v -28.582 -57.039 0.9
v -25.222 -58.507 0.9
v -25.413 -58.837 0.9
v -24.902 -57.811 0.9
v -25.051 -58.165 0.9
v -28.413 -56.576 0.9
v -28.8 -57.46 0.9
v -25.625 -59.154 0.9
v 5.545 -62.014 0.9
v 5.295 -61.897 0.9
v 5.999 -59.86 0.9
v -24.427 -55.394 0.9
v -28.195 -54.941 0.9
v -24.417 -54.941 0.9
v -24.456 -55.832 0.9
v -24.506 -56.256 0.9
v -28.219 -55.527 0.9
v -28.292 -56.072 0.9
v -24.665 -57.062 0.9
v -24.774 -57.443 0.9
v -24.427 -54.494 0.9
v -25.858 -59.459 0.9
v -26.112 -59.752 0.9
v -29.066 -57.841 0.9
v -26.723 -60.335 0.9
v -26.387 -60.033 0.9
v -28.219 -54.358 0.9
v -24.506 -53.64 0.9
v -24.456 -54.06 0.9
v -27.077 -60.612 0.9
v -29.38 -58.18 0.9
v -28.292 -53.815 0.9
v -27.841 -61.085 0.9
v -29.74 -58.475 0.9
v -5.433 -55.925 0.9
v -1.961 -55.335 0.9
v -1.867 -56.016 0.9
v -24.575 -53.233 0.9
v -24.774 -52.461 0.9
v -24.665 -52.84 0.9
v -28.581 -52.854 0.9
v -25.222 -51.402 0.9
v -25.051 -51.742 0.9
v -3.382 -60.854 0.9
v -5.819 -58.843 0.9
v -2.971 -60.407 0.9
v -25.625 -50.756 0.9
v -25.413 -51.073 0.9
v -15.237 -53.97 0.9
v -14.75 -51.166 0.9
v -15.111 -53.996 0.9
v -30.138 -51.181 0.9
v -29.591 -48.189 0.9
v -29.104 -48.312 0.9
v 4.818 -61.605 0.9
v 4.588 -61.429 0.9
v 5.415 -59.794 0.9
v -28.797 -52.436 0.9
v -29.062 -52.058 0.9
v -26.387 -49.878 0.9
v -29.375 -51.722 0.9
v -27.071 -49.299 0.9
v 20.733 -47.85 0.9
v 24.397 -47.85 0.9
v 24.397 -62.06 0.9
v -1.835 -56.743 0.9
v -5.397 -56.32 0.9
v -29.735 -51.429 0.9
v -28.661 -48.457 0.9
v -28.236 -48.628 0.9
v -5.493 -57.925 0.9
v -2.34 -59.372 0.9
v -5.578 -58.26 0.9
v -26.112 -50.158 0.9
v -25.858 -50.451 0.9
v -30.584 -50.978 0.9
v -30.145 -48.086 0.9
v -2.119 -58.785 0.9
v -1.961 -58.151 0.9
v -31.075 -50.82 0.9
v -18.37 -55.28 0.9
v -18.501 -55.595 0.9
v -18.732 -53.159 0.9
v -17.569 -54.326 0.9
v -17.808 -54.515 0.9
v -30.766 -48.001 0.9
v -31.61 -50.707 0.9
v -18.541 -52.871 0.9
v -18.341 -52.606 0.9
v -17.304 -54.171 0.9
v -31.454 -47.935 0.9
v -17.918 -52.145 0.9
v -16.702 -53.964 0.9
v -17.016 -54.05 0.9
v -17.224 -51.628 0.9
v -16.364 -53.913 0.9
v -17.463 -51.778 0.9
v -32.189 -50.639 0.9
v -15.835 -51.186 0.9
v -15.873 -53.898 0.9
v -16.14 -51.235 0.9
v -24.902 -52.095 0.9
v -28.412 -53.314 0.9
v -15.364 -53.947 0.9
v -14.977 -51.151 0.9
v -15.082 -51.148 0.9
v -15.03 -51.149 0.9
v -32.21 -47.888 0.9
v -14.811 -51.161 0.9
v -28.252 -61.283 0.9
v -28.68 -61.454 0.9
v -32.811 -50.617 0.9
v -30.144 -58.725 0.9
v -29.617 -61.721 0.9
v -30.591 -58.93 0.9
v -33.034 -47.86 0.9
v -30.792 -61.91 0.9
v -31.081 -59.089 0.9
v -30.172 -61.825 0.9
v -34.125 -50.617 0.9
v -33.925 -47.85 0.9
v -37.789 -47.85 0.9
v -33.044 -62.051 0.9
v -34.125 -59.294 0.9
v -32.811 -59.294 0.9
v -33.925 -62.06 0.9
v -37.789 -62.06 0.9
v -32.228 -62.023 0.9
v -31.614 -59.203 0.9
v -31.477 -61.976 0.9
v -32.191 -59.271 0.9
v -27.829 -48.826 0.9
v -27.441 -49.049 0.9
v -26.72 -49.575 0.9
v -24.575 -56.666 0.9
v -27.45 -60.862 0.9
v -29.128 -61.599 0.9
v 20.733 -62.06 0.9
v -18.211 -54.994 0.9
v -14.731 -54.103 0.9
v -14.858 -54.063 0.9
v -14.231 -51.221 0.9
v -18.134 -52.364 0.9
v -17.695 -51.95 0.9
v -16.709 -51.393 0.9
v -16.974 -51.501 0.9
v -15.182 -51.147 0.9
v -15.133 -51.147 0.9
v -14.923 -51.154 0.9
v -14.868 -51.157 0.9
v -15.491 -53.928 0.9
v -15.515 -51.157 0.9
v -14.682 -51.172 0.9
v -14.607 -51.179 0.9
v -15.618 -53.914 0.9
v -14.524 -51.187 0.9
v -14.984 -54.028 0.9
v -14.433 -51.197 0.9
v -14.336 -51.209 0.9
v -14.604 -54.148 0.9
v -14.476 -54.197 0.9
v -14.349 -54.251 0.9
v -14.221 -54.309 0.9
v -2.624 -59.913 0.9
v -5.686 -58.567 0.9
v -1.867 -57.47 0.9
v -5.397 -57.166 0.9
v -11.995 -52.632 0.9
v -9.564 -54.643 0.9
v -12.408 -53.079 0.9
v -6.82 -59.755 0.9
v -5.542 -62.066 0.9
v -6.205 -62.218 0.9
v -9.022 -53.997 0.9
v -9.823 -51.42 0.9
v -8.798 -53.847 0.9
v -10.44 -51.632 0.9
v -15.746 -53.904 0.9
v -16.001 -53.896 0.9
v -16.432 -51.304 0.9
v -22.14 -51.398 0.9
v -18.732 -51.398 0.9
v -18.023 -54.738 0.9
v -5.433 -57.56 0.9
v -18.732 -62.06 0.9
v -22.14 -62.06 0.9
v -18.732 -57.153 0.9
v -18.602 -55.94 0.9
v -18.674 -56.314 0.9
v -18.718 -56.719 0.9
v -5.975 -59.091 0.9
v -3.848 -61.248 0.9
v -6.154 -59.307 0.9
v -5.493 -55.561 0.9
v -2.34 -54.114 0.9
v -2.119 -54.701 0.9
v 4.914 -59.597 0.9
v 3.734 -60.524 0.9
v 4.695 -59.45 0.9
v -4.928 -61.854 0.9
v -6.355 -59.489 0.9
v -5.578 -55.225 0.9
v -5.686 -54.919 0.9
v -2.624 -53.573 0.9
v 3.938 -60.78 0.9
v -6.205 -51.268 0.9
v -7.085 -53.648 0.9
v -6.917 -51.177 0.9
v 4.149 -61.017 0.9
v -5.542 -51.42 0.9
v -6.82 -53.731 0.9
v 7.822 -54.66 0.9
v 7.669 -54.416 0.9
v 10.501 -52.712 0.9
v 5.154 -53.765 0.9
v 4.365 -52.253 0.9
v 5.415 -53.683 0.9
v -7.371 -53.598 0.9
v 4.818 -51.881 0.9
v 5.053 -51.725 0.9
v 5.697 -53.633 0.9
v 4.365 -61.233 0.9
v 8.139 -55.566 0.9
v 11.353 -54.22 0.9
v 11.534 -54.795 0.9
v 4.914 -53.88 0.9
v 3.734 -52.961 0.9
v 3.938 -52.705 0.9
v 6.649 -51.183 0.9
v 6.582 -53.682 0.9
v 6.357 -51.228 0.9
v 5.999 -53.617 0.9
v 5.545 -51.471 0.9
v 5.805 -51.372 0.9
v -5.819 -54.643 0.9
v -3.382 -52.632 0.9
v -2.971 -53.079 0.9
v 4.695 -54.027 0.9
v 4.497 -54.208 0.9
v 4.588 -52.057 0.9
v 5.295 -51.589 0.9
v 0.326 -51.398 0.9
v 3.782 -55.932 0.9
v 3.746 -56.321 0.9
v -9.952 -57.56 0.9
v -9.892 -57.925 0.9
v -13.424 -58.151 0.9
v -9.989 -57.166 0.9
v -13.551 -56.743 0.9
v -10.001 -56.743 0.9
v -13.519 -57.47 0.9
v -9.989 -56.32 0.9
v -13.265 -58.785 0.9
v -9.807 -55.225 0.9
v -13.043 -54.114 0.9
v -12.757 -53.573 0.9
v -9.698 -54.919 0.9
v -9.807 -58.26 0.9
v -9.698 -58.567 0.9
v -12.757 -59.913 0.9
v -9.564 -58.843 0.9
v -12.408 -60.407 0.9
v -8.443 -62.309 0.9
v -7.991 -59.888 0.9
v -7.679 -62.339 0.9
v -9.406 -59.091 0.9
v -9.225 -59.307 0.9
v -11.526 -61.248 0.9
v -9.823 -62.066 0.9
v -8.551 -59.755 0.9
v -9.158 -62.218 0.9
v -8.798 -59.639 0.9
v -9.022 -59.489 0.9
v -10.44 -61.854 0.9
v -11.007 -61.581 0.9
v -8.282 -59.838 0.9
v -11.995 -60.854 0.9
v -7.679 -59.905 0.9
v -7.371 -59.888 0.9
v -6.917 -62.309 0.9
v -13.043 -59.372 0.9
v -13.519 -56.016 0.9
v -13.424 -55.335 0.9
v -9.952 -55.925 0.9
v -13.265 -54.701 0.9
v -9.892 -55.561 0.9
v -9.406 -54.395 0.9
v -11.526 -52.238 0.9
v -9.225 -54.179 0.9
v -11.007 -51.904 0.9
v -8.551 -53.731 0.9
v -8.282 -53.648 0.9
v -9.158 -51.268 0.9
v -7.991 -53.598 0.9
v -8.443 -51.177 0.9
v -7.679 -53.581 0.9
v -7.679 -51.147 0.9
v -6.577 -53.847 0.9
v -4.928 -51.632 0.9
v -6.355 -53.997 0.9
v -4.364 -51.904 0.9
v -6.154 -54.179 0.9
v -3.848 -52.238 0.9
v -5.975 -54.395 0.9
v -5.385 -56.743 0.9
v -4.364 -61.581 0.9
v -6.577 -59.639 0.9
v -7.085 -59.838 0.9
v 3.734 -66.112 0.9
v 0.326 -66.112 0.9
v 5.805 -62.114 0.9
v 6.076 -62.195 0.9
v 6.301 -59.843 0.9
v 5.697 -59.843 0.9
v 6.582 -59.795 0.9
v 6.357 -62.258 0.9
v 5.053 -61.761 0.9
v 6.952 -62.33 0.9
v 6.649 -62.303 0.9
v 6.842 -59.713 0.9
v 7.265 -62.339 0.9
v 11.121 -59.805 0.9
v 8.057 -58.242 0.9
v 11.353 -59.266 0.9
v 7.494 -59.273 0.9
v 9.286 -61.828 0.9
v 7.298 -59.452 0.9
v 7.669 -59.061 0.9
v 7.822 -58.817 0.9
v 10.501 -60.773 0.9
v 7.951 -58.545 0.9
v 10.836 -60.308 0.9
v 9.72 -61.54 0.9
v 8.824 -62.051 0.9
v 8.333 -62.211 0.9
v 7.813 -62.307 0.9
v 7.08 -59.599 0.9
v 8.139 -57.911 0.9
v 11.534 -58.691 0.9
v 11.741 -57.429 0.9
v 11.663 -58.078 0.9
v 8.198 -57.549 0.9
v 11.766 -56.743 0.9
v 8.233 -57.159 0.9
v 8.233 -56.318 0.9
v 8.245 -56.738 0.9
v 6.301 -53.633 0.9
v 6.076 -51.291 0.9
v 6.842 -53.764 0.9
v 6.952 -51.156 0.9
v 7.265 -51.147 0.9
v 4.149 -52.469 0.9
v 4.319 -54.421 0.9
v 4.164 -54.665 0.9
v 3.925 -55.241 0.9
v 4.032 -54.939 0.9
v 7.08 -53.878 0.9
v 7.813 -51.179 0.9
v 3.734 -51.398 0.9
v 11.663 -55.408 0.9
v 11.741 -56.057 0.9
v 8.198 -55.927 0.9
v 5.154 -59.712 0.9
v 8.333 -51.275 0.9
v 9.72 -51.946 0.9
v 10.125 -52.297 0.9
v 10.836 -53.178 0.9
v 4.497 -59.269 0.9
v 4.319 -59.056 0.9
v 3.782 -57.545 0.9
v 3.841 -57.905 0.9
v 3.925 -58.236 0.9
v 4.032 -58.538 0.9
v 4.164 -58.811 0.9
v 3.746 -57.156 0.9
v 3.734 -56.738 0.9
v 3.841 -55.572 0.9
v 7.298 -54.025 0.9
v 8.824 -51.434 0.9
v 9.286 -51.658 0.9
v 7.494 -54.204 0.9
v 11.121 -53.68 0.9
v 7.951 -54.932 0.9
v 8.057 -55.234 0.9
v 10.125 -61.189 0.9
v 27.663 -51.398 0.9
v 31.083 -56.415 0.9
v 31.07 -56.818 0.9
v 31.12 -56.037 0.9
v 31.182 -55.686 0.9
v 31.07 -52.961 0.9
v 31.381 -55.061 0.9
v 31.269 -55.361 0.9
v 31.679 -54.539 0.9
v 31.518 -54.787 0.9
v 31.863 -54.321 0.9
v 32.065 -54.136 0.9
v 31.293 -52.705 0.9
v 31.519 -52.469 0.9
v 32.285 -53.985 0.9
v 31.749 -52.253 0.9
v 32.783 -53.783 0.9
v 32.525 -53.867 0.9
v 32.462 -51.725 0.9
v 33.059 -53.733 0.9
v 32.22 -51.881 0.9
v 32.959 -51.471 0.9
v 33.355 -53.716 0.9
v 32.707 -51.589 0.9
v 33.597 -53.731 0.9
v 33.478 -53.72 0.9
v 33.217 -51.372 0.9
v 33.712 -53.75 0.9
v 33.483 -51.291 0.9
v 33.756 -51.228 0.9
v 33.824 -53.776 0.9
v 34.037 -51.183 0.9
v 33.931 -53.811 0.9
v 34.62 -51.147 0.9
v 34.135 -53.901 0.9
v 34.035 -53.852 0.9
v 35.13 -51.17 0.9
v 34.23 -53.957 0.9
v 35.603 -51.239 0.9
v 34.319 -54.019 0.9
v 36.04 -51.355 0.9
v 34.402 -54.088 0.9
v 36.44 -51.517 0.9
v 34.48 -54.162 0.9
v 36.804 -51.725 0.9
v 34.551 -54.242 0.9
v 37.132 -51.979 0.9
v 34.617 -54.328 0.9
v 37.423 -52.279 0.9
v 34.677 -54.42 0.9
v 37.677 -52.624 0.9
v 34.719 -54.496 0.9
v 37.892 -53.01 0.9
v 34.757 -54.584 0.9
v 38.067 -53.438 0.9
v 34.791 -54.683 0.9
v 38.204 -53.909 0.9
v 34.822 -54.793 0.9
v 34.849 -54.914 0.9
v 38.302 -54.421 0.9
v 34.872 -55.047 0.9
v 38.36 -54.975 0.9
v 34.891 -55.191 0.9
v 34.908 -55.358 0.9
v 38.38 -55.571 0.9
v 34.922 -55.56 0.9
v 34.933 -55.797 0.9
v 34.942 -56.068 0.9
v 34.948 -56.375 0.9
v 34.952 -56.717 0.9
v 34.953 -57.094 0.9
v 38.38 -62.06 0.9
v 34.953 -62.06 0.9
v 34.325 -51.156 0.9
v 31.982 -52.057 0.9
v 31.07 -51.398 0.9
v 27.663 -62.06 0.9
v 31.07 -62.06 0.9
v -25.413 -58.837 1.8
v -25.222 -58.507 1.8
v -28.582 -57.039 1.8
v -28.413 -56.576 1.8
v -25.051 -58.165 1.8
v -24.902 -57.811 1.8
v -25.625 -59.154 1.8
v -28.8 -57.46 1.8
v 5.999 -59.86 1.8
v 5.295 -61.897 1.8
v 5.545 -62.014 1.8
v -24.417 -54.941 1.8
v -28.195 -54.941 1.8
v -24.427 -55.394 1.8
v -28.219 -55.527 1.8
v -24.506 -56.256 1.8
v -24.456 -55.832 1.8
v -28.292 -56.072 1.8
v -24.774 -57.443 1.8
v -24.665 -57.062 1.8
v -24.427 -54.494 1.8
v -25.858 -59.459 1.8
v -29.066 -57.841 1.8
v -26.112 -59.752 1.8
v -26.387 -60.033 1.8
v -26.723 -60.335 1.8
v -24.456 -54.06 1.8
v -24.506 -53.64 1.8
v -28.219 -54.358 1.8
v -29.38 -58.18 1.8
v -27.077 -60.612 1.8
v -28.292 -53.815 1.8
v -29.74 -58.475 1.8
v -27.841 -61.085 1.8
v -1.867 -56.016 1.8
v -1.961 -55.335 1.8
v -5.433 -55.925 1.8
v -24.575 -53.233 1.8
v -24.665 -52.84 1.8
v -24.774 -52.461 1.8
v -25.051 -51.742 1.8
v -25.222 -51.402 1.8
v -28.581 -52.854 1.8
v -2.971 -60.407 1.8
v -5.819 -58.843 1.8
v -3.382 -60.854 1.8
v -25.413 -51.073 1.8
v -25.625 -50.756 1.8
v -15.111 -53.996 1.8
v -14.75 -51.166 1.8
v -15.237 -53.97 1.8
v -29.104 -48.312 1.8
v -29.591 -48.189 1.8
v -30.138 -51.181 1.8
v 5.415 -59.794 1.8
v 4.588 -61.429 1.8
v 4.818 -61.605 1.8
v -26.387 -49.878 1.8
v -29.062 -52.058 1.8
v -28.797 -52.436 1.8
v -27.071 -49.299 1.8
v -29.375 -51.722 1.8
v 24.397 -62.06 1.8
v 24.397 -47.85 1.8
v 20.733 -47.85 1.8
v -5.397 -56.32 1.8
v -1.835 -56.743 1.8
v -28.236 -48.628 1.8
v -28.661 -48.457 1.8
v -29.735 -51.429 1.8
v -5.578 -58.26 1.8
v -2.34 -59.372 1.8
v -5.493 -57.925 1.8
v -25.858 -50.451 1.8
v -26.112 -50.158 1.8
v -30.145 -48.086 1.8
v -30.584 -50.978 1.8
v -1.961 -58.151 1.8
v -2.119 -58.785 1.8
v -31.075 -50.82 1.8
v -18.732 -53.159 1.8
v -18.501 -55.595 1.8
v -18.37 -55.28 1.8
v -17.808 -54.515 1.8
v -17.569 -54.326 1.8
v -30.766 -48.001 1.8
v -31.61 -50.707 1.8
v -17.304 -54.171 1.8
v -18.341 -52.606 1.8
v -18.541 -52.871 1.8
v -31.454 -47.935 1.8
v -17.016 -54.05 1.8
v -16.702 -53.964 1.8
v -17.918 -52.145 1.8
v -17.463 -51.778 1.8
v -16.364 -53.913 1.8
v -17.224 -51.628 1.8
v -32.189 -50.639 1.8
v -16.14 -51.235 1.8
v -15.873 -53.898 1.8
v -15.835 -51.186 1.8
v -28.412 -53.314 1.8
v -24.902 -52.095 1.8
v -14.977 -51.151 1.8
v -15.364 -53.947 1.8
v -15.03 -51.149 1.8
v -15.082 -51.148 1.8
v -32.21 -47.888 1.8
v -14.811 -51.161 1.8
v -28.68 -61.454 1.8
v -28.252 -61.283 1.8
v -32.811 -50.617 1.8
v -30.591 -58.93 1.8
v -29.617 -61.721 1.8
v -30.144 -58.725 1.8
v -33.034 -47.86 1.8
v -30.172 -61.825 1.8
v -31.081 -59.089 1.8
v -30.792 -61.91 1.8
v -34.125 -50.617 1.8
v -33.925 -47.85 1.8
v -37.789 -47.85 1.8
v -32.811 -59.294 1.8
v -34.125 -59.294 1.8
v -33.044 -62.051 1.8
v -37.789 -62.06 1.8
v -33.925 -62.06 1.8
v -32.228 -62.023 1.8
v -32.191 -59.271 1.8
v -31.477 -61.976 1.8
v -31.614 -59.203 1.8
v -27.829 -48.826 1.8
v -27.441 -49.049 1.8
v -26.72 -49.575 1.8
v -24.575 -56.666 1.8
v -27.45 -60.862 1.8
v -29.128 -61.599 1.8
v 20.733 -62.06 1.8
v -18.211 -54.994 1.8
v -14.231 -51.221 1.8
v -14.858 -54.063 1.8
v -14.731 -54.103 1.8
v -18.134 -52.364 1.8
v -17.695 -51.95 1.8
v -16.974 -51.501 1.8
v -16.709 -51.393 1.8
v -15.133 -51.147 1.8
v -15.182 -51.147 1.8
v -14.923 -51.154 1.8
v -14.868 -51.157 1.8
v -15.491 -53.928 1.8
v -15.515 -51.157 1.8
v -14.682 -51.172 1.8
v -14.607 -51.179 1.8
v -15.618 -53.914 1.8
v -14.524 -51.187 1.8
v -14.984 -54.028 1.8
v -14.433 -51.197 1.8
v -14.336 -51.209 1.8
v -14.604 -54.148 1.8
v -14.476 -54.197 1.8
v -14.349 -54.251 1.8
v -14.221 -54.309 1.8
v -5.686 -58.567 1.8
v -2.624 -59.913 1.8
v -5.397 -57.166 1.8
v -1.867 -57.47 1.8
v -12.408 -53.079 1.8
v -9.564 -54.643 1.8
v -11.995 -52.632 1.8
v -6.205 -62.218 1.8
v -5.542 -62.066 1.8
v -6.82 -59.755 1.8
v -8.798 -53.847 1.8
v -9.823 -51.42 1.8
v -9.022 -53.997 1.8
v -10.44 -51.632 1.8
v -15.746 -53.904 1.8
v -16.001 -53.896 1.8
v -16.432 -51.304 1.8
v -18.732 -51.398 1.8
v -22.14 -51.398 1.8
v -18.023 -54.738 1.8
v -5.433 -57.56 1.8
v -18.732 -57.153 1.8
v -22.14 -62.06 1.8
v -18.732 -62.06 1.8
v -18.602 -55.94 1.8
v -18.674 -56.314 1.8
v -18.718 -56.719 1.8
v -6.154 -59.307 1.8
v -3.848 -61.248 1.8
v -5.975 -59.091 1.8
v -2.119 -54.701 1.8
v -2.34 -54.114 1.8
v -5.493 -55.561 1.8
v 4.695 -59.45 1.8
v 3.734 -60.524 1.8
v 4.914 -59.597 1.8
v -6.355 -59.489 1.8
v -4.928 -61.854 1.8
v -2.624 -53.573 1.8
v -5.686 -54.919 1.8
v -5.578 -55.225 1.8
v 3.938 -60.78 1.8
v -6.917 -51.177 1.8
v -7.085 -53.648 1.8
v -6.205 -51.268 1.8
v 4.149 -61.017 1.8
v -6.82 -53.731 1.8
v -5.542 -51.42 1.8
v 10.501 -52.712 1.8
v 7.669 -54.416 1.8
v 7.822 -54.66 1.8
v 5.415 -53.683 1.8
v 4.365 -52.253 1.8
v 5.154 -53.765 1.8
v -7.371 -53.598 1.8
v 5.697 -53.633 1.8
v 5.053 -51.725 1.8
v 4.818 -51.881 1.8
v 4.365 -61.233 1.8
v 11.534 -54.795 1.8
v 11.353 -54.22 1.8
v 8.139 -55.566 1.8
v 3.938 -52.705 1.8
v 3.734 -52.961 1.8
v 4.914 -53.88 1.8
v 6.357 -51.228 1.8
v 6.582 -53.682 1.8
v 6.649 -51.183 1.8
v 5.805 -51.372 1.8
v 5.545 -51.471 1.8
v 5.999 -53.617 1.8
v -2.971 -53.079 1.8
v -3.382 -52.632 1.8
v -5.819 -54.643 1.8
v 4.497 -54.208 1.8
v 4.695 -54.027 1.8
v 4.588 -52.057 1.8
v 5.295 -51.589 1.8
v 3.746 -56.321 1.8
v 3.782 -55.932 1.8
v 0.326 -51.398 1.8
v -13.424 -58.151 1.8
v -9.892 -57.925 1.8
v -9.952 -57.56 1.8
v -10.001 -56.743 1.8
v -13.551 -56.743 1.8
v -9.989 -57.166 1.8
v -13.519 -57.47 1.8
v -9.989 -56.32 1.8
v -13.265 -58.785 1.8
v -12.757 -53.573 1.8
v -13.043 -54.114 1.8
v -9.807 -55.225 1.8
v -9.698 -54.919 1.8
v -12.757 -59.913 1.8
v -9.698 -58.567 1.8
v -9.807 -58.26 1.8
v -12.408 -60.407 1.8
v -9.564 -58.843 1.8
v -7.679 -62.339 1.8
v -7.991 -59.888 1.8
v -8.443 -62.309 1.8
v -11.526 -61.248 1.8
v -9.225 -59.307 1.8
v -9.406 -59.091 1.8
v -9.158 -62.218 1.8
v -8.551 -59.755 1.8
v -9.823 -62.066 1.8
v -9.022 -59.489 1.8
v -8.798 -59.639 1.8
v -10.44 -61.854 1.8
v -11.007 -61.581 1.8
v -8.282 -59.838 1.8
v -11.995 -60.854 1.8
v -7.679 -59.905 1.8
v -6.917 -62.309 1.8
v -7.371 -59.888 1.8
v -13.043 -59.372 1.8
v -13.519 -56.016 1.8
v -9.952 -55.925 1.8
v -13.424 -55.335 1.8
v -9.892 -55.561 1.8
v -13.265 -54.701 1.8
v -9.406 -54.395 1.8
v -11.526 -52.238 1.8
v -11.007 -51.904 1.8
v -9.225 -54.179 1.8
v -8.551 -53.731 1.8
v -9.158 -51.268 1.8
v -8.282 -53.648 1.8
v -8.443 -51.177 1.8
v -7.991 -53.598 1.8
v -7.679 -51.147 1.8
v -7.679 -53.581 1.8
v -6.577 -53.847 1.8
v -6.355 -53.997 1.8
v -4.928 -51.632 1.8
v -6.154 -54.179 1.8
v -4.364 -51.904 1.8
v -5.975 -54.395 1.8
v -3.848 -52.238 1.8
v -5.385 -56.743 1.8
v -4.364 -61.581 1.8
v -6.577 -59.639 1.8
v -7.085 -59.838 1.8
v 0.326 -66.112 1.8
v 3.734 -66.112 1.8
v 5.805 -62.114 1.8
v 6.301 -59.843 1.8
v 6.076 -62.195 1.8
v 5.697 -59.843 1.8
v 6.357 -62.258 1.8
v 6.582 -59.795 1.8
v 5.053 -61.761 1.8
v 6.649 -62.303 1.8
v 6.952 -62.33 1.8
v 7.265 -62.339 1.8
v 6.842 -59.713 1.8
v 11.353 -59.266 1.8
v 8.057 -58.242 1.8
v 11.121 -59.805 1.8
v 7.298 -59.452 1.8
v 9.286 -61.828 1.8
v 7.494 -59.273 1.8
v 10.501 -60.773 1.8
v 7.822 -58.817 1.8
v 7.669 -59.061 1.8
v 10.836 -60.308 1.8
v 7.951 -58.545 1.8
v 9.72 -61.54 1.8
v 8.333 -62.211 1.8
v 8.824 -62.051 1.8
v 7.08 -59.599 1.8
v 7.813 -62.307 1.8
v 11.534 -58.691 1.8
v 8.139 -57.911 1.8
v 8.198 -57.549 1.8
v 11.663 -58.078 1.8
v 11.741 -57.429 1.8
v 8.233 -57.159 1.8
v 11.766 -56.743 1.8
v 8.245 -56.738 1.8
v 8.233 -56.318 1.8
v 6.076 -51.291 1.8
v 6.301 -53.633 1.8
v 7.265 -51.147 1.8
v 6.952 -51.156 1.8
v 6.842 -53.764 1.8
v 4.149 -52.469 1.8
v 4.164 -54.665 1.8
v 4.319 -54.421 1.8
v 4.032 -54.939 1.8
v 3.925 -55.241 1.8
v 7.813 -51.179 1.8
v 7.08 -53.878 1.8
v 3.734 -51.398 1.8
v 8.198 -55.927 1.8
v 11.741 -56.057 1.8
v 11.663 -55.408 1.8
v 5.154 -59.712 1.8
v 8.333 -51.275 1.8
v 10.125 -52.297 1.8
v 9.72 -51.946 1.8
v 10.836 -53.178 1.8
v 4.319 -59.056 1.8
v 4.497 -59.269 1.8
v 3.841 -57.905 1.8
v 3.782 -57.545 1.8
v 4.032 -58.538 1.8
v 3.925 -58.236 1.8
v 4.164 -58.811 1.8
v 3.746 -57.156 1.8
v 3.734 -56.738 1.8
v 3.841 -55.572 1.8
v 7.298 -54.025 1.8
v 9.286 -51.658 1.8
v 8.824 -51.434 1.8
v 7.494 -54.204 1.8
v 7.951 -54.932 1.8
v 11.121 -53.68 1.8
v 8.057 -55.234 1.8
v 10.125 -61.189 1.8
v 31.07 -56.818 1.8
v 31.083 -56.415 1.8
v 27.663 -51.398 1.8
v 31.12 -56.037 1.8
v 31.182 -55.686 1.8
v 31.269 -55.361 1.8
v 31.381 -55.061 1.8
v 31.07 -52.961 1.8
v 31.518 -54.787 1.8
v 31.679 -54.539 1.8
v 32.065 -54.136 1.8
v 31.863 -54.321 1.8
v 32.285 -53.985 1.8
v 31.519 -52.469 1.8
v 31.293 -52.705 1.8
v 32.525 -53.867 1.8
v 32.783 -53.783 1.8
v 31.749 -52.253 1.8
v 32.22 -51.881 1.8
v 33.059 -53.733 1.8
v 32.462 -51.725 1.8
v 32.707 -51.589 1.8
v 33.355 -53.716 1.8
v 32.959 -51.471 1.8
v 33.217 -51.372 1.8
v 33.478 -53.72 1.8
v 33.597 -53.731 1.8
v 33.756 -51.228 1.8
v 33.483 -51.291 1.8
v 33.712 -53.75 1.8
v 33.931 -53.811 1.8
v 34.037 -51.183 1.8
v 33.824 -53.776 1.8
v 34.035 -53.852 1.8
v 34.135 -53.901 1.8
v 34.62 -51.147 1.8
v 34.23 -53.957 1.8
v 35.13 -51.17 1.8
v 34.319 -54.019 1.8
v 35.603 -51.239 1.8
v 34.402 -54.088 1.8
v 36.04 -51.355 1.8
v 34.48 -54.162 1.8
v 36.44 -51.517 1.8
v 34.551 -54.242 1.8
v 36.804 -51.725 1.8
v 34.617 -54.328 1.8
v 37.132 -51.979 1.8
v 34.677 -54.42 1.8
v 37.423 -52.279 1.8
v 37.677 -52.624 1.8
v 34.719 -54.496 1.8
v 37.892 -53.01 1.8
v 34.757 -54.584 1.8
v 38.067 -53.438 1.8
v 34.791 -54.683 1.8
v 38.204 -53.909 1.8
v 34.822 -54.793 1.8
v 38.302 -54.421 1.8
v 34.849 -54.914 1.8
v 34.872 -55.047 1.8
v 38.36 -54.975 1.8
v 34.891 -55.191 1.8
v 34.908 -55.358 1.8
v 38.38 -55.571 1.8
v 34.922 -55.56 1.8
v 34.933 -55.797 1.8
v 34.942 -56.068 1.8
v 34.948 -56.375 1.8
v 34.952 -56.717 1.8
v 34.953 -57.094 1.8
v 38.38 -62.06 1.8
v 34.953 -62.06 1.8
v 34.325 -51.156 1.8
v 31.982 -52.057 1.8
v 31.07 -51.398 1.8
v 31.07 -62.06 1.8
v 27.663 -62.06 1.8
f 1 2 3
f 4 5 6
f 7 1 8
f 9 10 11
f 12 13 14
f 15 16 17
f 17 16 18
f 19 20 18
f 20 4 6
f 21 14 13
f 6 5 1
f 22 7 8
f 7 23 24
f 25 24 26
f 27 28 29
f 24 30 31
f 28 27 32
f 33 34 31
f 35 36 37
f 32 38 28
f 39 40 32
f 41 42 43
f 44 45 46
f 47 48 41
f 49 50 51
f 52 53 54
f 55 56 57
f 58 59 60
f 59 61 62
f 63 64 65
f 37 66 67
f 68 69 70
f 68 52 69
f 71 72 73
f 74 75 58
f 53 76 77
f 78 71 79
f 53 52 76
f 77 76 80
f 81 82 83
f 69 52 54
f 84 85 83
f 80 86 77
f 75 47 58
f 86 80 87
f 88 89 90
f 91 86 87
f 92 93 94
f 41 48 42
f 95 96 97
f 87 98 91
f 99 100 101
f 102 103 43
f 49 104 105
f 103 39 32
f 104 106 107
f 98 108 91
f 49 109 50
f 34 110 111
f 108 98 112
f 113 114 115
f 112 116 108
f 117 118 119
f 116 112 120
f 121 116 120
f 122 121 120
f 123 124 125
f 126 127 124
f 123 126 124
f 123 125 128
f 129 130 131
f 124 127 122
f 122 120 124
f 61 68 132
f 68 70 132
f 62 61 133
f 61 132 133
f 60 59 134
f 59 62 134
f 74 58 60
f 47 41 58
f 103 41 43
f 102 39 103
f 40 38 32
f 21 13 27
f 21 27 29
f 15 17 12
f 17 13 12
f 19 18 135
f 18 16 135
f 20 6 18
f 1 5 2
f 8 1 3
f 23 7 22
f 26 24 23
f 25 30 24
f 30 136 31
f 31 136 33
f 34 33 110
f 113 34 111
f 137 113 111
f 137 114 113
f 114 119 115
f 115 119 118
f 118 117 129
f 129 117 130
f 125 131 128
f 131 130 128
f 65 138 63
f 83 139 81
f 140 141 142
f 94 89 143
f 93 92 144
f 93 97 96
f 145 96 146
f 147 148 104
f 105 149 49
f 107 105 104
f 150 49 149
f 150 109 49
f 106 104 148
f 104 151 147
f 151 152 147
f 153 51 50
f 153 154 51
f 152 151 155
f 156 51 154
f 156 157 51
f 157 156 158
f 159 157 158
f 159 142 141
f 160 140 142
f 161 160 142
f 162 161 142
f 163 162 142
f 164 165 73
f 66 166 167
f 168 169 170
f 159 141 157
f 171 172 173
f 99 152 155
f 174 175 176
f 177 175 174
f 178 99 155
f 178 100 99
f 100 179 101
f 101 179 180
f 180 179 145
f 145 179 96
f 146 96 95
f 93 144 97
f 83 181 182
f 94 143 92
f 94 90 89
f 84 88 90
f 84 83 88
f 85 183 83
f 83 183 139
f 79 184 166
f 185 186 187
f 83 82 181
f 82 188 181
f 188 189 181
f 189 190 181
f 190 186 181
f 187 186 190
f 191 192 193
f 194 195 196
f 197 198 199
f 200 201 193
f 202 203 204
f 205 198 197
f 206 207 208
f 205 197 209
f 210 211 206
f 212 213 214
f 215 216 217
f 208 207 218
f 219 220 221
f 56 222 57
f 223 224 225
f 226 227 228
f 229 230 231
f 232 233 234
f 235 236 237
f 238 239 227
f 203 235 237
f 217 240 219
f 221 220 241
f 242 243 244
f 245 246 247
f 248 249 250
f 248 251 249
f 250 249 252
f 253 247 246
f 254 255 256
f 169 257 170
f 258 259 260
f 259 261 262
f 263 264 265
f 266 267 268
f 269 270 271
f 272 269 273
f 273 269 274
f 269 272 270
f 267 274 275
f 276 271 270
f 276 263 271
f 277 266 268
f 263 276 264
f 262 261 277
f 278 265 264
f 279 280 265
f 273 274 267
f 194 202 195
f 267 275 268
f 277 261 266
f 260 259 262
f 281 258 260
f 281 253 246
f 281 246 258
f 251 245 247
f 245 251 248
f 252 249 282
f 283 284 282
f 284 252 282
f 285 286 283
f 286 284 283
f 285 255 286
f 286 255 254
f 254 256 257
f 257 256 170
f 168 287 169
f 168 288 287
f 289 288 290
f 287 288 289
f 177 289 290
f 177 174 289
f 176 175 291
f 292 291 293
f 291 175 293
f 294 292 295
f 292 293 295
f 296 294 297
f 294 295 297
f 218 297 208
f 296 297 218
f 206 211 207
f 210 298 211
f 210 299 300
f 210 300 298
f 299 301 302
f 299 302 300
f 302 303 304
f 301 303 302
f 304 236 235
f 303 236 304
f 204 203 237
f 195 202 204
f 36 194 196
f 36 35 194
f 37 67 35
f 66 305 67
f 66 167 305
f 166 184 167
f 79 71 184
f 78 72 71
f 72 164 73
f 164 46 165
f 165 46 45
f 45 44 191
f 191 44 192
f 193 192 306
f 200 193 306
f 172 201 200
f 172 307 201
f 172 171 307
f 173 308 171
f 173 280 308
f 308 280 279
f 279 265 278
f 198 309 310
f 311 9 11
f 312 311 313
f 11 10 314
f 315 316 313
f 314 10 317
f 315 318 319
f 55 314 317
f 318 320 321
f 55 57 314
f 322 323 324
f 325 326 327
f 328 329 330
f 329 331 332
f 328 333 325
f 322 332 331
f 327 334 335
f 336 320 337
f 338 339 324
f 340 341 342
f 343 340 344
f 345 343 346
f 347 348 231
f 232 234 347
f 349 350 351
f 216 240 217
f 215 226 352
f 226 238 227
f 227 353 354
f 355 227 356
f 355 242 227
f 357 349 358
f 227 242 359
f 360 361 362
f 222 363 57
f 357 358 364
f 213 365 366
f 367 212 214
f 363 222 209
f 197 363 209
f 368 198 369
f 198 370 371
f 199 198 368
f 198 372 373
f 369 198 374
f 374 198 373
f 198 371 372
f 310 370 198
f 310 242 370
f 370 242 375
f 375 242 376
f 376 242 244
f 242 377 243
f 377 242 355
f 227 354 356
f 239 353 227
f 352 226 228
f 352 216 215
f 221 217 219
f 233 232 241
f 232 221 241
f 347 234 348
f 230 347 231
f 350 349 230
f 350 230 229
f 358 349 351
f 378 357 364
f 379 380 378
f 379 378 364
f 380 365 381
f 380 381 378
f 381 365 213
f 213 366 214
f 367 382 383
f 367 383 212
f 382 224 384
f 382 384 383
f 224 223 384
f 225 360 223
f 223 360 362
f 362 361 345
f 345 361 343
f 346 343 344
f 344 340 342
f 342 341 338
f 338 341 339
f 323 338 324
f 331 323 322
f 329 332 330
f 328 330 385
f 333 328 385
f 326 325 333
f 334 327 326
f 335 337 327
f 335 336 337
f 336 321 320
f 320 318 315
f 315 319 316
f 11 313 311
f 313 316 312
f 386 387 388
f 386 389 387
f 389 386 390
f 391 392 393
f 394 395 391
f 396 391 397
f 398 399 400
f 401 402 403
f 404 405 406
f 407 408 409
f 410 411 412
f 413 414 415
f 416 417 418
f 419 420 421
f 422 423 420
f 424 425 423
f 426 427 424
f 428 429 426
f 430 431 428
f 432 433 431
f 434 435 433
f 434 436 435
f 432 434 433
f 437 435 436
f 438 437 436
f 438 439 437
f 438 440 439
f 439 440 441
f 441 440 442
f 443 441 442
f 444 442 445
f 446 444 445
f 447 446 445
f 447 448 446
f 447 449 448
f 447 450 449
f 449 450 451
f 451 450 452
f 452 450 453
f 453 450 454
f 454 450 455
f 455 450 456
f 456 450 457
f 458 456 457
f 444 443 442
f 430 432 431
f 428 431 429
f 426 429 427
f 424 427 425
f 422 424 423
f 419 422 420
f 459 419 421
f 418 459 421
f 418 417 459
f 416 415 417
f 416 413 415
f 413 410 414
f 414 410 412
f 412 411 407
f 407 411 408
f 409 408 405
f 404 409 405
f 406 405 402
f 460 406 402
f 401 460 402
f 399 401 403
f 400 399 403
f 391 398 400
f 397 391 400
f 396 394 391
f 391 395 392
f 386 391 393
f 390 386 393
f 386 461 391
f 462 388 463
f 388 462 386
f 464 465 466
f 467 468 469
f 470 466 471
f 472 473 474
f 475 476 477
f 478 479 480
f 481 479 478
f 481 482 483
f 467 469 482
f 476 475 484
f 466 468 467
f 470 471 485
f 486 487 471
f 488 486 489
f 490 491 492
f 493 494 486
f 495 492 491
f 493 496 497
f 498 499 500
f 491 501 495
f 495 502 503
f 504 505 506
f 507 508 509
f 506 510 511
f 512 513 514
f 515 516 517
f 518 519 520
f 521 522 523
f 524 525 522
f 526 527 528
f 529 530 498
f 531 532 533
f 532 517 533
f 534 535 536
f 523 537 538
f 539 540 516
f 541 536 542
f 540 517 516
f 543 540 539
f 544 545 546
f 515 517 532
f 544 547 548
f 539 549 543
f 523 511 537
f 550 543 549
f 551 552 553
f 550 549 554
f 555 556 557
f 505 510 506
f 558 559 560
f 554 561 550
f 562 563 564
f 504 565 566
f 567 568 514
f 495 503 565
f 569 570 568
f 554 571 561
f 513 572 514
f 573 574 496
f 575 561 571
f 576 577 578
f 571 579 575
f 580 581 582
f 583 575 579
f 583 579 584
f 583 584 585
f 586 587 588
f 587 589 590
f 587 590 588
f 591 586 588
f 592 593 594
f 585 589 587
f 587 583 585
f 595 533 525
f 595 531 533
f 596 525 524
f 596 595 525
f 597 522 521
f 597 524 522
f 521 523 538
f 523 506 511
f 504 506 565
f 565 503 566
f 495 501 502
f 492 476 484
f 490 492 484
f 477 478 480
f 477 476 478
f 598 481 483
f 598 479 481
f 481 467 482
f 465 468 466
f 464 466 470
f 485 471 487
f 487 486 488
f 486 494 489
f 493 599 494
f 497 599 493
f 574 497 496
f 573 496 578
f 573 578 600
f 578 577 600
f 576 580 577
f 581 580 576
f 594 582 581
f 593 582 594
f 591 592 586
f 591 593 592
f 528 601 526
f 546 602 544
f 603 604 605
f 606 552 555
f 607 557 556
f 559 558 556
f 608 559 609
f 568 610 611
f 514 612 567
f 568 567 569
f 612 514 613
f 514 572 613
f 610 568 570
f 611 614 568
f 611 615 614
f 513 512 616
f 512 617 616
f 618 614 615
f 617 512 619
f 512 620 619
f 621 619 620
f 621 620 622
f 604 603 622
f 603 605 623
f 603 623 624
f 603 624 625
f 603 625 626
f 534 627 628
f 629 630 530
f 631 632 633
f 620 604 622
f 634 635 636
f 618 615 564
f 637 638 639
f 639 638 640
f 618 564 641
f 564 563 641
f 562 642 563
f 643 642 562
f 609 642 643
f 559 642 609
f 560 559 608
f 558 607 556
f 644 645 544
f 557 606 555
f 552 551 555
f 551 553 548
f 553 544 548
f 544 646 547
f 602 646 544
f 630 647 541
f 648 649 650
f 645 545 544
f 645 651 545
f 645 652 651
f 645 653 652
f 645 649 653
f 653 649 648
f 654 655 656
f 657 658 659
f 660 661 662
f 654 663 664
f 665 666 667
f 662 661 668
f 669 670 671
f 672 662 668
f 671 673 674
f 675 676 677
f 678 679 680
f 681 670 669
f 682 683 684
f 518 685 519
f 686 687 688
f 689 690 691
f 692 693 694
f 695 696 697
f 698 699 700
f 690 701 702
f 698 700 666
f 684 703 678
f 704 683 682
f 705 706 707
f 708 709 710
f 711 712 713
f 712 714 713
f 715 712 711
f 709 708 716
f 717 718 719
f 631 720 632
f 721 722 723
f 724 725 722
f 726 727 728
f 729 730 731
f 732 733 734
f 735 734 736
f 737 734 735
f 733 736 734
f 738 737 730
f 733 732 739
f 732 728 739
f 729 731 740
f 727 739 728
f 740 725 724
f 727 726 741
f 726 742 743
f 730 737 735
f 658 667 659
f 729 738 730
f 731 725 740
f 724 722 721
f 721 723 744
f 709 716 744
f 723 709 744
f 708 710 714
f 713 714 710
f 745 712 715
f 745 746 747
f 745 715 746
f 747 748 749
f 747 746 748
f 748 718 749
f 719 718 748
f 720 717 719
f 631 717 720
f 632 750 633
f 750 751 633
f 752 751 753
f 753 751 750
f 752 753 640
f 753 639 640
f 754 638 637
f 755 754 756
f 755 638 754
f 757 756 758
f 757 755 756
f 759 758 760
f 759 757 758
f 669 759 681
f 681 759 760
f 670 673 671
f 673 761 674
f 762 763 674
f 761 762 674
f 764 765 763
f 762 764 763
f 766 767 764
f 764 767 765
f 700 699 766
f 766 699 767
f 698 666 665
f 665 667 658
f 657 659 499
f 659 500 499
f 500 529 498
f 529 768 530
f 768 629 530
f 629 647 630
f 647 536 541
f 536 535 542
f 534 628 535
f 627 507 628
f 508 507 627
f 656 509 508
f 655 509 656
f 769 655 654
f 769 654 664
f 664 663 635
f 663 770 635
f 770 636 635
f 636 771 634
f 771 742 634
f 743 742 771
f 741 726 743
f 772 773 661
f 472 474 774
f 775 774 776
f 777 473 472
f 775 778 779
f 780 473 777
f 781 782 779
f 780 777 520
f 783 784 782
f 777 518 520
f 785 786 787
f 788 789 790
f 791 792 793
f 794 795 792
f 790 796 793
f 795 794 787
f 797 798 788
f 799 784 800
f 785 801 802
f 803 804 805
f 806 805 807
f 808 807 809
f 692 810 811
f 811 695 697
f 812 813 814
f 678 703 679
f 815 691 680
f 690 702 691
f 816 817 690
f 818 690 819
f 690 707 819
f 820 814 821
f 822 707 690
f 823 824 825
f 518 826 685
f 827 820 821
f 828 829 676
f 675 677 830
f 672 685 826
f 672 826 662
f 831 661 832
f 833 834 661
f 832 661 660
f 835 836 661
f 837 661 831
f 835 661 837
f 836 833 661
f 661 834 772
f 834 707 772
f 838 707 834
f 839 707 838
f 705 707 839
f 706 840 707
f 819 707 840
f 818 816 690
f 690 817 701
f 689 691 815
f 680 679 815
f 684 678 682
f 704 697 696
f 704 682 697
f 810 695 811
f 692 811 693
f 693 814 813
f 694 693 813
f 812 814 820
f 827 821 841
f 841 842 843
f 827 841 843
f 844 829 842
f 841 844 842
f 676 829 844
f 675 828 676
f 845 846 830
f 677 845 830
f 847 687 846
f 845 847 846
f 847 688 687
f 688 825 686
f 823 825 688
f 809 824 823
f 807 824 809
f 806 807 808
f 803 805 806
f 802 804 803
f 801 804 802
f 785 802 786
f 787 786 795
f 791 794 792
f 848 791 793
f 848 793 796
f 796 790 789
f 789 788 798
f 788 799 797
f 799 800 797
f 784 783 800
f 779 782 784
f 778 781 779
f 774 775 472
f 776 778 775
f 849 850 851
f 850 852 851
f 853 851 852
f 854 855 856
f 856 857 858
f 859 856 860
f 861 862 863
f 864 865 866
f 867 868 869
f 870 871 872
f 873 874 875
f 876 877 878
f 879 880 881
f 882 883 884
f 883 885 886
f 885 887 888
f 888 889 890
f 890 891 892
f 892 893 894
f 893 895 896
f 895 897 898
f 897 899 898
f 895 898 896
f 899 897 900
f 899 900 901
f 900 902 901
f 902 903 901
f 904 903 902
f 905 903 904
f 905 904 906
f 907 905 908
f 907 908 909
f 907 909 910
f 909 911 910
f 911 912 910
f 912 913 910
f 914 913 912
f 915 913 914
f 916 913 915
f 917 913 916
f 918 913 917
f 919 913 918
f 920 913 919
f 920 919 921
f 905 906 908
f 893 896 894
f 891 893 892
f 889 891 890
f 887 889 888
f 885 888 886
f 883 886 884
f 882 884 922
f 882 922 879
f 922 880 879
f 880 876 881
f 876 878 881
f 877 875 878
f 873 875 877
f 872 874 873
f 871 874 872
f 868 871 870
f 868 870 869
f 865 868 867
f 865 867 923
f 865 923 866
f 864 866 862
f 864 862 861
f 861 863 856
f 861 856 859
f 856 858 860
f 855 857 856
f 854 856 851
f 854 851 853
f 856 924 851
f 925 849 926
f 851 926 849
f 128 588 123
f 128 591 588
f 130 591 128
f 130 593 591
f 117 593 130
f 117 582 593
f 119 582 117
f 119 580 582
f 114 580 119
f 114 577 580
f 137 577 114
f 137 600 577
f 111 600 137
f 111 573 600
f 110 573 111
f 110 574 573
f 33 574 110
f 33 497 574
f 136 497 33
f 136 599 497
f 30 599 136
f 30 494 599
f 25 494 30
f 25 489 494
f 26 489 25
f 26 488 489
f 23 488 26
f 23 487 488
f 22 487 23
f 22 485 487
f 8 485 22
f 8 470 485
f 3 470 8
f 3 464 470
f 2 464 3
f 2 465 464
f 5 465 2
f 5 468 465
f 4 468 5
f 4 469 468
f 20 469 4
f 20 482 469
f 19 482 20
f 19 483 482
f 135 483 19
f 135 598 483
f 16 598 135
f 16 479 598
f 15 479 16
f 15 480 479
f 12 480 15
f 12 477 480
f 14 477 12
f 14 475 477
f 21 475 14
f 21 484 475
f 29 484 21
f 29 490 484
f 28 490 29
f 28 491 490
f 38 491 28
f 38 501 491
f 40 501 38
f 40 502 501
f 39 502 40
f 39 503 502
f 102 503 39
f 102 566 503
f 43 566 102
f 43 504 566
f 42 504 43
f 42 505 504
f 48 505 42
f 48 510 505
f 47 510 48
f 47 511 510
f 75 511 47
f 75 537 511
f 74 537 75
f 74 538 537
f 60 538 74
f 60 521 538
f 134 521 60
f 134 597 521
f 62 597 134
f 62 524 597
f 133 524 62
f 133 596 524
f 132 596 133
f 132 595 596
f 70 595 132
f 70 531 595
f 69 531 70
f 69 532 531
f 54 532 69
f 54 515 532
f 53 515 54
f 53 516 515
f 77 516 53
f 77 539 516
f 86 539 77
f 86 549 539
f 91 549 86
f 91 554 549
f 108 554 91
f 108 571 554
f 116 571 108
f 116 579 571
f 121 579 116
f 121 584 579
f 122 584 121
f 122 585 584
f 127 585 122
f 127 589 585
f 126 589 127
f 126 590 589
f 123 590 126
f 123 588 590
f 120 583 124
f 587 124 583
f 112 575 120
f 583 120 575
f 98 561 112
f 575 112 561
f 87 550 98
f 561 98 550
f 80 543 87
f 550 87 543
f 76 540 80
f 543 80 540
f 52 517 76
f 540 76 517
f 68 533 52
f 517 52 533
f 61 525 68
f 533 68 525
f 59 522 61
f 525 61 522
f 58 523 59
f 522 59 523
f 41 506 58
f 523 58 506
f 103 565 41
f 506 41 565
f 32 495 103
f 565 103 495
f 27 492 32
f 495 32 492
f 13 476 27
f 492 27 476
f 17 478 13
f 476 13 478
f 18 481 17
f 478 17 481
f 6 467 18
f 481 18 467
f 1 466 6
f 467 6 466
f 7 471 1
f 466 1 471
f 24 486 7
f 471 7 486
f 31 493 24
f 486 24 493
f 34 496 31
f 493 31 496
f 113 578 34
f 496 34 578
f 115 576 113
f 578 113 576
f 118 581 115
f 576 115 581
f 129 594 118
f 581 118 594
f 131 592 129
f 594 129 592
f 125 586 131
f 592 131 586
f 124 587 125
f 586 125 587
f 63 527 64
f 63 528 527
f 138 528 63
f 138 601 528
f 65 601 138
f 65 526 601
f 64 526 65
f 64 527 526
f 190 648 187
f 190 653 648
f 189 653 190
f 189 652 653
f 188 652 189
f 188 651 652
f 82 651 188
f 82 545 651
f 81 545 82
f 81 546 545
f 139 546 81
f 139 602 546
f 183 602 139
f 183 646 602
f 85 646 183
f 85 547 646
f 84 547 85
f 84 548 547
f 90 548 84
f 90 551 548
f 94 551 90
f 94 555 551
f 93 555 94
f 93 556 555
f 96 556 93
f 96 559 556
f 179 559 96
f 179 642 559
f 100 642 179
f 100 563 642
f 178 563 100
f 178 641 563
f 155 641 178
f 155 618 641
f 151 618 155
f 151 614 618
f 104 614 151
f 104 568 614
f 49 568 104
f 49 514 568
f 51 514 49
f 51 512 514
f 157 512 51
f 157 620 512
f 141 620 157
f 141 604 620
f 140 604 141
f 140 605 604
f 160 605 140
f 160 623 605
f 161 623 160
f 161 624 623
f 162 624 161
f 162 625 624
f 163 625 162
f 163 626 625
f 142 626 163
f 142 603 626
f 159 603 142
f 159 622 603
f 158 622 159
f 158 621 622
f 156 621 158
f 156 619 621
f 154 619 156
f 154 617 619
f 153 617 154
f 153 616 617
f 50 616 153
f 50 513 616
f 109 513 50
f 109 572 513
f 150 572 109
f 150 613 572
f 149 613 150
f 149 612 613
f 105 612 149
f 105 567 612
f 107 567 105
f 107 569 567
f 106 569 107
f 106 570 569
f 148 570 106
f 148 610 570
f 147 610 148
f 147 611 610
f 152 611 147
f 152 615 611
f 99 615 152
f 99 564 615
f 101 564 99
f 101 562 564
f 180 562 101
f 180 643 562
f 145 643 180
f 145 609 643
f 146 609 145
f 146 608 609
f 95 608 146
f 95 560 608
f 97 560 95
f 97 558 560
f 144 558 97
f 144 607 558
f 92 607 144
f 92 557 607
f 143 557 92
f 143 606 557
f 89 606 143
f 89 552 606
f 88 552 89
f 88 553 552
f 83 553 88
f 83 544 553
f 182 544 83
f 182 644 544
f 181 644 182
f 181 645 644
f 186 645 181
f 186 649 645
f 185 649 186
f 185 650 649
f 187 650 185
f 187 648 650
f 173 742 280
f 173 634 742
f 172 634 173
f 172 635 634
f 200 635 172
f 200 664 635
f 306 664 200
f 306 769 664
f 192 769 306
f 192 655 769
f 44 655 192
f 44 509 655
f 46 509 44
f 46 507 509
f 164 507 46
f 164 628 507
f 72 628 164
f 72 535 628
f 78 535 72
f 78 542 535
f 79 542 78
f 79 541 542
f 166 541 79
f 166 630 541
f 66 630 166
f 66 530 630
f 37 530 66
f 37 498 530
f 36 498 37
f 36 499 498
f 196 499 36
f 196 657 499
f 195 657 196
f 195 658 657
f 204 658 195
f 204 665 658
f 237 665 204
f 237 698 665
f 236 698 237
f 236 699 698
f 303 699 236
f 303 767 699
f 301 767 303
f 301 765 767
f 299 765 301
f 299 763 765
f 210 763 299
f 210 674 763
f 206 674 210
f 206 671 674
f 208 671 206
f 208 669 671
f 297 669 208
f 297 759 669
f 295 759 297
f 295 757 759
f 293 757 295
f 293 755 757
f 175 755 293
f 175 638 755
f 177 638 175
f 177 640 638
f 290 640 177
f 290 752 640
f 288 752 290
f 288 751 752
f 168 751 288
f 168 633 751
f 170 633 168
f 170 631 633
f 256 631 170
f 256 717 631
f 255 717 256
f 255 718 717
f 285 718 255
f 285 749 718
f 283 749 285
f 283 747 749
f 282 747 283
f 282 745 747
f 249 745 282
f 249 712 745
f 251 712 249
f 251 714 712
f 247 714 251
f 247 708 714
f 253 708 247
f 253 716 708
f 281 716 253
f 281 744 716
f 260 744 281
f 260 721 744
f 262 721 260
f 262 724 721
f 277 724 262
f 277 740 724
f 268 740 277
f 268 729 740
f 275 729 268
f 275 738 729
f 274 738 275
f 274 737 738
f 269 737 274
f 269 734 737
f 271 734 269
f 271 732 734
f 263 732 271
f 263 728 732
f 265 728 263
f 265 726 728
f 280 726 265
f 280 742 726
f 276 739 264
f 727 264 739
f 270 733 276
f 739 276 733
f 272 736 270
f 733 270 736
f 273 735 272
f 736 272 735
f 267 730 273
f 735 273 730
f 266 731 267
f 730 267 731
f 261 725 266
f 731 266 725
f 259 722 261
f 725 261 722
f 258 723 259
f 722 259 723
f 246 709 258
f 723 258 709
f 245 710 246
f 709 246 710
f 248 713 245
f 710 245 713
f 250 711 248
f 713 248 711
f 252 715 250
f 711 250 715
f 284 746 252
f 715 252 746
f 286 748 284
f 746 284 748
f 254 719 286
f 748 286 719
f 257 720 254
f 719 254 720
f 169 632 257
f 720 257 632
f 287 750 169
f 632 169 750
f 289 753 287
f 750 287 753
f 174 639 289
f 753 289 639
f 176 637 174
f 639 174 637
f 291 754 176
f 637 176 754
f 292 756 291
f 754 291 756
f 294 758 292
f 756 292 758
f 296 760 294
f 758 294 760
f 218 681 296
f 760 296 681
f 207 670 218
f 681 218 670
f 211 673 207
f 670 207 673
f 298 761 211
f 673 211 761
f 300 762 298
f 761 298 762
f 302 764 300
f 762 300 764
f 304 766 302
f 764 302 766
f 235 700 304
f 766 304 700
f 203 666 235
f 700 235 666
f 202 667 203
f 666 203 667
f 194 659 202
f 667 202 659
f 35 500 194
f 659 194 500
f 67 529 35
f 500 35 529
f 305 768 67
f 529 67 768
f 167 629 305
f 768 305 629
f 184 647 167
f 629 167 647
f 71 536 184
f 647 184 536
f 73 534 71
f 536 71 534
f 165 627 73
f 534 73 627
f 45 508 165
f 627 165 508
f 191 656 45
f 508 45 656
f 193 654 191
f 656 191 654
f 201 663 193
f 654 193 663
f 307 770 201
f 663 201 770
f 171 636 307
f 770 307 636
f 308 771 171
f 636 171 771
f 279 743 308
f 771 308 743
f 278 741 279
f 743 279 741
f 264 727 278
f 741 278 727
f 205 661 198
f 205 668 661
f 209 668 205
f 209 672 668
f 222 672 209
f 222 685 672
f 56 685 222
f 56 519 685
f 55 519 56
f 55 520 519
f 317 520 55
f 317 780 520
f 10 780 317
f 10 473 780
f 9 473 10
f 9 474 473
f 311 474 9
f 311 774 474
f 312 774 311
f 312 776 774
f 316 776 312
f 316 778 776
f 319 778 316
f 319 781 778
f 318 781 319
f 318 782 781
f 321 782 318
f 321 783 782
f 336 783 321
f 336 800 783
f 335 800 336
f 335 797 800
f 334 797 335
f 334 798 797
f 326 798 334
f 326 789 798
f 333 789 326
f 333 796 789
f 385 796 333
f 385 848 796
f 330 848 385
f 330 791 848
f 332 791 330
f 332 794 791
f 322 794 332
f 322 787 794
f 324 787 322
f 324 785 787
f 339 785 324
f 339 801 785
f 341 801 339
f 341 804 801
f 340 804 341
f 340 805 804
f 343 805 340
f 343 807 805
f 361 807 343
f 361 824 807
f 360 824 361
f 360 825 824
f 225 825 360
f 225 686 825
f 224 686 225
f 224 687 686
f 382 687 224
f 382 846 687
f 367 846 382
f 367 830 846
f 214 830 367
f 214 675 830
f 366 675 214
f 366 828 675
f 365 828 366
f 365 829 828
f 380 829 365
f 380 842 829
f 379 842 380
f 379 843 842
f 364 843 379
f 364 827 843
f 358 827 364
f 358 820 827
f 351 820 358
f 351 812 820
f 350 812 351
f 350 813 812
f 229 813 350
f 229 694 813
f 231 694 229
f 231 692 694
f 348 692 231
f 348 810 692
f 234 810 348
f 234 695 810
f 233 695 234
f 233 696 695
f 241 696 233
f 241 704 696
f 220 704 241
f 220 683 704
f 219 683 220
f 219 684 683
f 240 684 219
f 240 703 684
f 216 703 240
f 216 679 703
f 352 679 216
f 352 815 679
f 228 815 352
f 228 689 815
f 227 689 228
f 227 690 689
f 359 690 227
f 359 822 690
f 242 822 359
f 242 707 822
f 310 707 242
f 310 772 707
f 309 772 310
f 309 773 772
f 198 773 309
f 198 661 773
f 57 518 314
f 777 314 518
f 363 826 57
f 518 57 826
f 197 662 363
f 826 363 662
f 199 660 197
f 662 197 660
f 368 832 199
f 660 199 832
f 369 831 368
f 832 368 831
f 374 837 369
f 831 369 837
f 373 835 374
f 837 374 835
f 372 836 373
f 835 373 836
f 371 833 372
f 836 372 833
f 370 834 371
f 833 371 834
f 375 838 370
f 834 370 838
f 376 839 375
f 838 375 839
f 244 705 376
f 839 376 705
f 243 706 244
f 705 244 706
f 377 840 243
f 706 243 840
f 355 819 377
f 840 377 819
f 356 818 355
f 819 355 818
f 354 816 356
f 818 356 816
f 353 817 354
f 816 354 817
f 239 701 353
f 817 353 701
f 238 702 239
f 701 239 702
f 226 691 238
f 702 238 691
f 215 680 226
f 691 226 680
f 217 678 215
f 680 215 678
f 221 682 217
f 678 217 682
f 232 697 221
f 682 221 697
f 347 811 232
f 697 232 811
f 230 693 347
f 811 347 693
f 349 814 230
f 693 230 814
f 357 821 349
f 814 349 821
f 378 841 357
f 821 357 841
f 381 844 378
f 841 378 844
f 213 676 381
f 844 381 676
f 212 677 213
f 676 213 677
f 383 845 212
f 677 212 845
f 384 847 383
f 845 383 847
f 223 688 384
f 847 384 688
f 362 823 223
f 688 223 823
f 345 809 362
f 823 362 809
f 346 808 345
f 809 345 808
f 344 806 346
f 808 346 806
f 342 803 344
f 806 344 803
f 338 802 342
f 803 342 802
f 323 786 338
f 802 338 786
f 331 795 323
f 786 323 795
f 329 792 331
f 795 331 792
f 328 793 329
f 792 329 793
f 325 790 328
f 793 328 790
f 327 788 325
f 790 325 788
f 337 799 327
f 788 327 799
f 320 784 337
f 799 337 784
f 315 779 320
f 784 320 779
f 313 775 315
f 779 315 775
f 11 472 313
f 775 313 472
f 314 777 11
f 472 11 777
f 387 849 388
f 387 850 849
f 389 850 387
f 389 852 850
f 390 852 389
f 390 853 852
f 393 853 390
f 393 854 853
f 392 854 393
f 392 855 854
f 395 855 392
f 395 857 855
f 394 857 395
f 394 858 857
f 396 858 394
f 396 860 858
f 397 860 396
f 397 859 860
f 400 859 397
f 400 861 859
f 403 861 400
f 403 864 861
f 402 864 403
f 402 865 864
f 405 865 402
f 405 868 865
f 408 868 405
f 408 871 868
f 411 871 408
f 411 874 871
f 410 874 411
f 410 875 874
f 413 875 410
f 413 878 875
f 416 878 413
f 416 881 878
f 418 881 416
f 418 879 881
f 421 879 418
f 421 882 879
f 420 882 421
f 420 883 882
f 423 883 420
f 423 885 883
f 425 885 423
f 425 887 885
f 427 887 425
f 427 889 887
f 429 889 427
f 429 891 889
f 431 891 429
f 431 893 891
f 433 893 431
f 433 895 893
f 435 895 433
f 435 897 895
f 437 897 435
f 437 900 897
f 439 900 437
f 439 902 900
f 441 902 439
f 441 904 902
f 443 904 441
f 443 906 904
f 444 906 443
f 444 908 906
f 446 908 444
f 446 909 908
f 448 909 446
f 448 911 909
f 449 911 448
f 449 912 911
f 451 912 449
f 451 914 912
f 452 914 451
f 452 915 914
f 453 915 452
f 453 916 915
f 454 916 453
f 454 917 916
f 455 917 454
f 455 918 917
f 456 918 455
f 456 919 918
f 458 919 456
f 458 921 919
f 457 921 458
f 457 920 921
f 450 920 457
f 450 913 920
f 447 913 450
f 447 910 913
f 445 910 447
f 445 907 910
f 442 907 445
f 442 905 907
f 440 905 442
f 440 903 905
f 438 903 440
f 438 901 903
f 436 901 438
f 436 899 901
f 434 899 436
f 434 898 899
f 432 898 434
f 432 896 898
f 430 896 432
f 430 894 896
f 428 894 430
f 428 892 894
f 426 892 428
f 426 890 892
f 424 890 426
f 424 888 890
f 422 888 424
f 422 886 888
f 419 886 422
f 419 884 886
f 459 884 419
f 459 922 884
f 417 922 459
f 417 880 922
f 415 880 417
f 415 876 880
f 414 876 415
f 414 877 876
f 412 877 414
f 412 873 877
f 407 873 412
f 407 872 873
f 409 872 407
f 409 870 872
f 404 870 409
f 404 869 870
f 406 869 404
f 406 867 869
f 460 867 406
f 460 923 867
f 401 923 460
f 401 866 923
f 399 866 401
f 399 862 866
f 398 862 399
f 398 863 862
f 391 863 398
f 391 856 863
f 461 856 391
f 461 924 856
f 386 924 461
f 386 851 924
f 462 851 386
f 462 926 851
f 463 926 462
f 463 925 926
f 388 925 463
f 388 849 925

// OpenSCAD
$fn = 48;
  // English (below bottom hole)
  translate([0, -57.100, 0.900]) linear_extrude(height=0.900) text("Drop In", size=14.035, halign="center", valign="center", font="Helvetica Neue:style=Bold");
